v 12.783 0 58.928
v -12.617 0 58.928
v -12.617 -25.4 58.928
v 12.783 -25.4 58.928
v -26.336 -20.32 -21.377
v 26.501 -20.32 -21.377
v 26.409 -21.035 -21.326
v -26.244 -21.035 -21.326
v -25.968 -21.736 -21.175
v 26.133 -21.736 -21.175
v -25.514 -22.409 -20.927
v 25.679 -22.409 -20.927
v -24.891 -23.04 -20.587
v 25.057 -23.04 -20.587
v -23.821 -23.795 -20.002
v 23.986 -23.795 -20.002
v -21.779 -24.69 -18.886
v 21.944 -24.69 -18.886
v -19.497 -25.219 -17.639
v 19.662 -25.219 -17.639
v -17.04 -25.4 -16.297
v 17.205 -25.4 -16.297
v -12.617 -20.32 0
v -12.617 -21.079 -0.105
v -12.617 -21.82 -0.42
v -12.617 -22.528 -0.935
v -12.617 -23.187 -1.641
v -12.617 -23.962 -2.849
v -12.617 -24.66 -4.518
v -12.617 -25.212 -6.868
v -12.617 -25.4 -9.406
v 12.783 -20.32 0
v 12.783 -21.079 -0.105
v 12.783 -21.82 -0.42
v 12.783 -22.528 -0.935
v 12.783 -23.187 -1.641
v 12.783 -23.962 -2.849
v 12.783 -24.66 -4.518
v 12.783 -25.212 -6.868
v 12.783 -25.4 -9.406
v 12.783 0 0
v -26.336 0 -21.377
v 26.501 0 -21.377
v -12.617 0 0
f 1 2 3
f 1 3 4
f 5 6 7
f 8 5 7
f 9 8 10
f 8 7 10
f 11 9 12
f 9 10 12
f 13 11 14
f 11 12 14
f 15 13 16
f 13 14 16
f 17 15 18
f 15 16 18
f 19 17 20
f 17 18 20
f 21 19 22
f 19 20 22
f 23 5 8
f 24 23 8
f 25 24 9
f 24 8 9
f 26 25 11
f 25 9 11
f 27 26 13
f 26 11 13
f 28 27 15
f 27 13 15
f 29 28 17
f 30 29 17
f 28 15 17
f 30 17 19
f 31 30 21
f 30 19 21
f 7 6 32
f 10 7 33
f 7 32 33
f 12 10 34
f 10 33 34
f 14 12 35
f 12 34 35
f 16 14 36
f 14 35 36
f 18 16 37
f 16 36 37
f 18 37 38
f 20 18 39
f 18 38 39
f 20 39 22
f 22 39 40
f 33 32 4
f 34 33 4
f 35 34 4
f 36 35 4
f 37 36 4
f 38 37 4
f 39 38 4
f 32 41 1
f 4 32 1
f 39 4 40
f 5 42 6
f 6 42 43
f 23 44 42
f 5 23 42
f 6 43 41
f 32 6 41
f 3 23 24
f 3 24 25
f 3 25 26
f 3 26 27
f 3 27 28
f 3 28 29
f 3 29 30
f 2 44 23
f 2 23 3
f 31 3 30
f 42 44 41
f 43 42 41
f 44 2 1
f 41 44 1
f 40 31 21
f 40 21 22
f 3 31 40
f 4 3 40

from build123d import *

# Parameters (mm, degrees)
F0_W     = 25.4
F0_H     = 58.92757
F1_DEPTH = 25.4
F2_R     = 5.08


with BuildPart() as f1:
    # F0 (on Front) → F1 (new body)
    with BuildSketch(Plane.XZ):
        with Locations((0.082556, 29.463785)):
            Rectangle(F0_W, F0_H)
        Polygon((12.782556, 0), (-12.617444, 0), (-26.336173, -21.37654), (26.501286, -21.37654), align=None)
    extrude(amount=F1_DEPTH)

    # F2
    f2_edges = [f1.edges().sort_by_distance(p)[0] for p in [
        (-19.476808, -25.4, -10.68827),
        (0.082556, -25.4, -21.37654),
        (19.641921, -25.4, -10.68827),
    ]]
    fillet(f2_edges, radius=F2_R)


solid = f1.part
